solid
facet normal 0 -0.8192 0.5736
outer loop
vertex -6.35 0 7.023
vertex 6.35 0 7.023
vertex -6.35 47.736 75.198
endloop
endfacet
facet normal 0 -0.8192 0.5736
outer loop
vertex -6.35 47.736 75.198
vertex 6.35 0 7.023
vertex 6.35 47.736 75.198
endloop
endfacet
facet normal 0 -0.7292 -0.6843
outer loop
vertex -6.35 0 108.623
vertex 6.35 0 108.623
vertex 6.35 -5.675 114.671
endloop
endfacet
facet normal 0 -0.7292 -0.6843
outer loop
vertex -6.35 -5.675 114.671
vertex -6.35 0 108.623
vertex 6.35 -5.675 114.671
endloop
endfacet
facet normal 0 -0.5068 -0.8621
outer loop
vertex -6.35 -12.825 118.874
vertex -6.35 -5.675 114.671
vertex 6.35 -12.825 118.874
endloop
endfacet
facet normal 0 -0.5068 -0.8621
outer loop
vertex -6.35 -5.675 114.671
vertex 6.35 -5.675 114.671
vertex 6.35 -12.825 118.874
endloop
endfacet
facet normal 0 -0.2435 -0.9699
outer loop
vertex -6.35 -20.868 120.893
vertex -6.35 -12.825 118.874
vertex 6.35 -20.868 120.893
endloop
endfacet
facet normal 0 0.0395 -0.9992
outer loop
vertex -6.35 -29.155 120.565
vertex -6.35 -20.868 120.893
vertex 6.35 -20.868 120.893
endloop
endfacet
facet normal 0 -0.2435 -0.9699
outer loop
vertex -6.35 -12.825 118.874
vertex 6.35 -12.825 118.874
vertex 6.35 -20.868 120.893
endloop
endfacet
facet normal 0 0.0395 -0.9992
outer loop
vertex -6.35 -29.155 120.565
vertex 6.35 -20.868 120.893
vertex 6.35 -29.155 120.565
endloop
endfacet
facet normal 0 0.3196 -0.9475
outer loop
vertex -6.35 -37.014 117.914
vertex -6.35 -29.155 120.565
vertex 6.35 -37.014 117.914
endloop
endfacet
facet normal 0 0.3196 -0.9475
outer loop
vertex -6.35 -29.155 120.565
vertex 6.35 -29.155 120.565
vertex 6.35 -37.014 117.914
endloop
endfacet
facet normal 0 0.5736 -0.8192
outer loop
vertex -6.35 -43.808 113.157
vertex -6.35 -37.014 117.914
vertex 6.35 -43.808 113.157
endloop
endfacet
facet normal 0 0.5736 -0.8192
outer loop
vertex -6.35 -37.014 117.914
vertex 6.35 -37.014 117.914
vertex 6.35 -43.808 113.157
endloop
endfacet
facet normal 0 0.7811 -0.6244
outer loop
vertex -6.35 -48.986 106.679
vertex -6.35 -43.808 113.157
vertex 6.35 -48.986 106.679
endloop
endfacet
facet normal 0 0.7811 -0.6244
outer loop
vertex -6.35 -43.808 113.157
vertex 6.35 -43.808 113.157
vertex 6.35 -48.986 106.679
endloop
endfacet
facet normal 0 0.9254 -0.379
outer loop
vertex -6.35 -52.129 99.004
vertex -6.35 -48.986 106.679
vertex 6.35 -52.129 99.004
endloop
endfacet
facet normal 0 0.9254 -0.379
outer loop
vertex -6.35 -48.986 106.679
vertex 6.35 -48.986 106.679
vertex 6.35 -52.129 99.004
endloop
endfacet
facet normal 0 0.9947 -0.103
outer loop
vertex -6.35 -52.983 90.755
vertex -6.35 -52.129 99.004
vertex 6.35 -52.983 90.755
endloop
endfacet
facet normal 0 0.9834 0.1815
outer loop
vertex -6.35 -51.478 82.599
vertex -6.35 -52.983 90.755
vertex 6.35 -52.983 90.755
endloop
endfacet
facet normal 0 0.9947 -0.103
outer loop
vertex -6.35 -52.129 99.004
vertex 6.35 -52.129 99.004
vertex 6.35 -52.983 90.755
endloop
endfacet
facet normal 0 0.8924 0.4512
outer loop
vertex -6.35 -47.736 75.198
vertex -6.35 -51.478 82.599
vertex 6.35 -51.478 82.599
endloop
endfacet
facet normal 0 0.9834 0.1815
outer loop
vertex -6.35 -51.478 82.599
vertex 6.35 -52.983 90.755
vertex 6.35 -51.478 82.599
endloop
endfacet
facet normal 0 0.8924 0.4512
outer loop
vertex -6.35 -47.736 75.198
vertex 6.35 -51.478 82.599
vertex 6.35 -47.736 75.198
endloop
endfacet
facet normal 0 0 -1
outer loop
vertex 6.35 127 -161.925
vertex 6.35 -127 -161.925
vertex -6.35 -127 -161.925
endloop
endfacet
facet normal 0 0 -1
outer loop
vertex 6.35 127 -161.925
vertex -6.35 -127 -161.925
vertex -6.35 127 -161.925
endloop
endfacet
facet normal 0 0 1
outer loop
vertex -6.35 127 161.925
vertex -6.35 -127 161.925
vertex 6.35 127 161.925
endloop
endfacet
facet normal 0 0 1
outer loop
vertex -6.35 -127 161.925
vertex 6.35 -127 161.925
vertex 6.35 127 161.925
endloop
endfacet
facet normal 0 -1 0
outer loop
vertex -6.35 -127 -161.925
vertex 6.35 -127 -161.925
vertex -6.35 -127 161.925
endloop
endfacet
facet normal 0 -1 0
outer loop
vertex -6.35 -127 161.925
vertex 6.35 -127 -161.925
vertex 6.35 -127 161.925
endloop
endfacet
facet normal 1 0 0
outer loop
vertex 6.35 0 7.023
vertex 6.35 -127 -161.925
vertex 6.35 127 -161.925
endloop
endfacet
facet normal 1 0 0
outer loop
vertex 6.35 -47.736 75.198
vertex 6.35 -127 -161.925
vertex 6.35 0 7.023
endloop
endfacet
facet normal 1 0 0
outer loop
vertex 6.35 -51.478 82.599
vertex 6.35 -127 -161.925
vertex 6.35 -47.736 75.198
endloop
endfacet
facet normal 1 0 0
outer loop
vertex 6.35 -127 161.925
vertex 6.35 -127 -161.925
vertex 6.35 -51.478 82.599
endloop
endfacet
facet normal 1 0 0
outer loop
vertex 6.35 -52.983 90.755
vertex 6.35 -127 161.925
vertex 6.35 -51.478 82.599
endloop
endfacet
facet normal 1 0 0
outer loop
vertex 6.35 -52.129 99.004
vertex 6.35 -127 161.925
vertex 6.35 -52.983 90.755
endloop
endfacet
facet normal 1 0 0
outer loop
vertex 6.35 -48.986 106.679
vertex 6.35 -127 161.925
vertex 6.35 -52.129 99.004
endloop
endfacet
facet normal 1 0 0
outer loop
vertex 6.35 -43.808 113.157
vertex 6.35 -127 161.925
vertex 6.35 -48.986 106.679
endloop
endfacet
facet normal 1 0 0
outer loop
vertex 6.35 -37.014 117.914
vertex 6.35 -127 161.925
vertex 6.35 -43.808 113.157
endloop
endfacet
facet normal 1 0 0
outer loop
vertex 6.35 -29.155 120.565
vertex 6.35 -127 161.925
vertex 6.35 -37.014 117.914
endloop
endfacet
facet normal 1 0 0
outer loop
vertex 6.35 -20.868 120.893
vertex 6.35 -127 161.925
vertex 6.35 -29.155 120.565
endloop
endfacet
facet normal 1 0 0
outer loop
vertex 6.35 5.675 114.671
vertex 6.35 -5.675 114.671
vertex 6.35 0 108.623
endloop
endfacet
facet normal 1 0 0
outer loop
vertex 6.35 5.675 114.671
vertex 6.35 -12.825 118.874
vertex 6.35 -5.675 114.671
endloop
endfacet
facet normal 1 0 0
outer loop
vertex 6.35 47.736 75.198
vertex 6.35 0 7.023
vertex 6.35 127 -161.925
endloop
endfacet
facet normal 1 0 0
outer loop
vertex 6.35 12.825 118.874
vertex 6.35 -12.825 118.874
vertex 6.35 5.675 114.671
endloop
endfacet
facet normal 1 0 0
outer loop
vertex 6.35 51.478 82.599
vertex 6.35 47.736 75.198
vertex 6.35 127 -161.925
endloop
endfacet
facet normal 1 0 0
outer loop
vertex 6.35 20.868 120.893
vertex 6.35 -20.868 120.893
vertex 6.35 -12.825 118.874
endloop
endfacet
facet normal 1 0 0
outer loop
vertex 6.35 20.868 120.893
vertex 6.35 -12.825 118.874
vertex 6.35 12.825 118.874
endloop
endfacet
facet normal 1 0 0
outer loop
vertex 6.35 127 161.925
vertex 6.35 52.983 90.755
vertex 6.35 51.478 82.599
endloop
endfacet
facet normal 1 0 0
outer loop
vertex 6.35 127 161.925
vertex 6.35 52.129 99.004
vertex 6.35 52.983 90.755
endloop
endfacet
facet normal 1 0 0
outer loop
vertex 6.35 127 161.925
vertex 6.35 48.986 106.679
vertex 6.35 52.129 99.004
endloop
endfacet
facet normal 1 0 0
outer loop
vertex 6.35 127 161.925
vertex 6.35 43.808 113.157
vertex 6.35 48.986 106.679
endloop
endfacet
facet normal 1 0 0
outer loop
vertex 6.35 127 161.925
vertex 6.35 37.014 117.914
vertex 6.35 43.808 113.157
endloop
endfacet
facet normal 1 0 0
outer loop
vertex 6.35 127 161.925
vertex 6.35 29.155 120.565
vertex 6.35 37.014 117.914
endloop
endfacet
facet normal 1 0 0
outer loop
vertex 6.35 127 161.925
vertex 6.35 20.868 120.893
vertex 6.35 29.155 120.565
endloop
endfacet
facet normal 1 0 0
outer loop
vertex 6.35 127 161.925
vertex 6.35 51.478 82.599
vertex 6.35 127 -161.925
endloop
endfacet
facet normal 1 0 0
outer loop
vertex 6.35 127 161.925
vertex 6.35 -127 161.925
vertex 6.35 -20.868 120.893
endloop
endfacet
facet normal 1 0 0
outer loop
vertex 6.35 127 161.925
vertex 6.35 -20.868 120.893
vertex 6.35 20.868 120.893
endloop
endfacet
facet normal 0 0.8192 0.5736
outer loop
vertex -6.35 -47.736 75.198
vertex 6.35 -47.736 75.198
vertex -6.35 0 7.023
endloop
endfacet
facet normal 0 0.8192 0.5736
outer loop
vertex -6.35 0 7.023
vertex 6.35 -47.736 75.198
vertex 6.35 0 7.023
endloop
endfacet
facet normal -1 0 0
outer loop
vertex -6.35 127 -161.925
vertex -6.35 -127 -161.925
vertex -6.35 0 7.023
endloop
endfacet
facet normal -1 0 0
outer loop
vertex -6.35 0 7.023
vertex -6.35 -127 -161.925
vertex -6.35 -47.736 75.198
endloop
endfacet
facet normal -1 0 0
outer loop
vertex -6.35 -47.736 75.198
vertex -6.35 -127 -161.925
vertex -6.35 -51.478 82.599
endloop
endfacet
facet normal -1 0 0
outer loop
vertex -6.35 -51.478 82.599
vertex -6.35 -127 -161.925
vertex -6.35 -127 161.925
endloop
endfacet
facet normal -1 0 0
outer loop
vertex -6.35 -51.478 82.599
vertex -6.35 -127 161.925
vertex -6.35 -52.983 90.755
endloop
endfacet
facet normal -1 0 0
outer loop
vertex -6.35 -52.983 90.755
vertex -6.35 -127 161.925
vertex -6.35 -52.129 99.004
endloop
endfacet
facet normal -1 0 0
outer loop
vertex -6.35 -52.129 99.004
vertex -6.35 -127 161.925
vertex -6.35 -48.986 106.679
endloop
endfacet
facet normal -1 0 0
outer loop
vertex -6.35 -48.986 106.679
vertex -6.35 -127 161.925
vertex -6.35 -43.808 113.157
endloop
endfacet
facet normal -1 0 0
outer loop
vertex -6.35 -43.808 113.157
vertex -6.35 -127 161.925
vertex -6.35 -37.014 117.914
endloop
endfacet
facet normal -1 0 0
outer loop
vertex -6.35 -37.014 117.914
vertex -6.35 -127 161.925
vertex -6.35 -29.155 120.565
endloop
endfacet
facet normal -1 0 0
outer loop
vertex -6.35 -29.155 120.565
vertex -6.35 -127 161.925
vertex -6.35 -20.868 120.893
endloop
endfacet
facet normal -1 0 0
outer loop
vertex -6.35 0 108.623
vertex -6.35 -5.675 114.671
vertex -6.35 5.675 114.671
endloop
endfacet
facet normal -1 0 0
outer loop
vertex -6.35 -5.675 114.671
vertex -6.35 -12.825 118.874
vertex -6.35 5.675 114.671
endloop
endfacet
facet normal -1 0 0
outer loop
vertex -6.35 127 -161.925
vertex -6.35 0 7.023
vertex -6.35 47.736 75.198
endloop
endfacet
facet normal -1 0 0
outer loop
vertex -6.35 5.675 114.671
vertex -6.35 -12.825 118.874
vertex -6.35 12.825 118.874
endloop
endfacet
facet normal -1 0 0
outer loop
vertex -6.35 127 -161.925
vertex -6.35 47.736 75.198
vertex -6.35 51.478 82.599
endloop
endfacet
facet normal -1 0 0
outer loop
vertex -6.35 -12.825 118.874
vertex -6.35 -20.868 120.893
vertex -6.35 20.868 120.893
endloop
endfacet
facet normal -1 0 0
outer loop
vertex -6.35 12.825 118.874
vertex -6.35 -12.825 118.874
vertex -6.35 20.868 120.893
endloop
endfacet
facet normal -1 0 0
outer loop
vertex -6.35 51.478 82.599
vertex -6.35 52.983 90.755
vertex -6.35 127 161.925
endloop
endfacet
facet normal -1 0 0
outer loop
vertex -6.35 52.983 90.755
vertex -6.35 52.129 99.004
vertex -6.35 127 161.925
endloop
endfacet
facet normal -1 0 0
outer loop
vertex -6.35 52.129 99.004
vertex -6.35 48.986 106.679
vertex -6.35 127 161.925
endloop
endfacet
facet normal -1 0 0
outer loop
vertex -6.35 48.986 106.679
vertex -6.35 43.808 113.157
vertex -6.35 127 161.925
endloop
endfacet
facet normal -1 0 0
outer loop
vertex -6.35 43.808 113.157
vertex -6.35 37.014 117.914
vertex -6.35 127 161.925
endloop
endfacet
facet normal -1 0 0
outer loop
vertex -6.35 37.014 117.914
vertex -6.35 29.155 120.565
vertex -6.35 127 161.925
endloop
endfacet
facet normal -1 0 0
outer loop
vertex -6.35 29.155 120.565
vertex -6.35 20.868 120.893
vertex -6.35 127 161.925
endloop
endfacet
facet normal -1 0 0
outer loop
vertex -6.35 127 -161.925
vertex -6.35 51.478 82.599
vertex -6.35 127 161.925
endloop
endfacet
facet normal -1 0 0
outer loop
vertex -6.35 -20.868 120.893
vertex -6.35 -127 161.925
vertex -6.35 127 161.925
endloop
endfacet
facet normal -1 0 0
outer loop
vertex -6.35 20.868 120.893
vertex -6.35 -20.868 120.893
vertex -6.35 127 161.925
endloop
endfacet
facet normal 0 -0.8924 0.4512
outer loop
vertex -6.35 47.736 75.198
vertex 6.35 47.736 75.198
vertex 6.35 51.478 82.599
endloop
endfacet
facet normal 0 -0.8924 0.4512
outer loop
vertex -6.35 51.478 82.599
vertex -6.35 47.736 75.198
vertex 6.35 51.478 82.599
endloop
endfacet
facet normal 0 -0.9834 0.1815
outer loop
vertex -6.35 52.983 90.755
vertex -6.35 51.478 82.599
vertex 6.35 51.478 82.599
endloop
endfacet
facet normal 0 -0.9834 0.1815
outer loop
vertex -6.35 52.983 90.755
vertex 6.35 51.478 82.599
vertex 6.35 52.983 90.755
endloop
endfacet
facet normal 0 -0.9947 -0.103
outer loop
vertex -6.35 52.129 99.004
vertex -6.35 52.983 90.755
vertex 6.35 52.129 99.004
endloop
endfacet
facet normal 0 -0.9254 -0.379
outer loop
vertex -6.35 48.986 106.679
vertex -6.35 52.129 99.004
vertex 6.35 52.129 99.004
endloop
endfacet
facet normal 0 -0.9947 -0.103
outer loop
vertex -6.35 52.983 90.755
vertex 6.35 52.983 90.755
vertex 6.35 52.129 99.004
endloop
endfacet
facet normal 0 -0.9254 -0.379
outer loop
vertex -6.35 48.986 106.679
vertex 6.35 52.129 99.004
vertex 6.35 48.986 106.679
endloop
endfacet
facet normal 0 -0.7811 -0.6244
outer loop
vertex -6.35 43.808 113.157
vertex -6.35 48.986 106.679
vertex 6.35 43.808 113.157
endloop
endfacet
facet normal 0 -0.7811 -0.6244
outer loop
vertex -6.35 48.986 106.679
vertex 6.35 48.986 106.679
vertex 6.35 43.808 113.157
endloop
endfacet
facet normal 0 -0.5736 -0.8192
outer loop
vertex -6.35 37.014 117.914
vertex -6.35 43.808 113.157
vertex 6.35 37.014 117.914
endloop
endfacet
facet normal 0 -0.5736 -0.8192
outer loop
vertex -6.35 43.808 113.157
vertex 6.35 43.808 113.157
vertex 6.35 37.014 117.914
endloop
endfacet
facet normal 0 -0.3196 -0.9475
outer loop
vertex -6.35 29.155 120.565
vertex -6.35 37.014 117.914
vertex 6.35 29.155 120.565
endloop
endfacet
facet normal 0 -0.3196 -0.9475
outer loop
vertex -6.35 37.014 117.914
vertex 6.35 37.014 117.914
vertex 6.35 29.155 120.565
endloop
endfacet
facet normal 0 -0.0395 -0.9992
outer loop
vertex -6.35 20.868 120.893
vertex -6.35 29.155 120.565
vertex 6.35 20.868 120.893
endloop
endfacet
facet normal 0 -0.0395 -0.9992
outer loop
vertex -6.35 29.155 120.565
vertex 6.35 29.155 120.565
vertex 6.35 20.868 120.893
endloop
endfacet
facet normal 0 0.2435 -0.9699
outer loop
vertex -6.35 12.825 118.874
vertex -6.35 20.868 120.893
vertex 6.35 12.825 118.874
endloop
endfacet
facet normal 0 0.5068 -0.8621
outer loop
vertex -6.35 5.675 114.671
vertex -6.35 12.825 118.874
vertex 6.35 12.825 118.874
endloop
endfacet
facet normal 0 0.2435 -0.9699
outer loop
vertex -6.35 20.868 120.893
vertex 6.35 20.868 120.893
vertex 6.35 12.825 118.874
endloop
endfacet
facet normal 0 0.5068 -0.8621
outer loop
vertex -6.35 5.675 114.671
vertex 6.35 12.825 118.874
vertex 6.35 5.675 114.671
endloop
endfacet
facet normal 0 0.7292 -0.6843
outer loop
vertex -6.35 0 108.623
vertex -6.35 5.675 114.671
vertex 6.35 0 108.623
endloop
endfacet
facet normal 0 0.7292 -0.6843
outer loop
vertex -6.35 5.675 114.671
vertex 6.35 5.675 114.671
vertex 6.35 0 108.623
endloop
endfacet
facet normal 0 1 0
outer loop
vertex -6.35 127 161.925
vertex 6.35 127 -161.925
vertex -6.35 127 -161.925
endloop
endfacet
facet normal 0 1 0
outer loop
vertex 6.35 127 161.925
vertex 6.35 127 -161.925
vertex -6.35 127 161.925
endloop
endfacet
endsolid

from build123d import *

# Parameters (mm, degrees)
F0_W     = 254
F0_H     = 323.85
F1_DEPTH = 6.35
F3_DEPTH = 12.7


with BuildPart() as f1:
    # F0 (on Right) → F1 (new body, symmetric)
    with BuildSketch(Plane.YZ):
        Rectangle(F0_W, F0_H)
    extrude(amount=F1_DEPTH, both=True)

    # F2 (on Right) → F3 (cut, symmetric)
    with BuildSketch(Plane.YZ):
        Polygon((0, 75.19789), (0, 7.023266), (47.736385, 75.19789), align=None)
        with BuildLine():
            Line((-47.736385, 75.19789), (0, 7.023266))
            Line((0, 7.023266), (0, 75.19789))
            Line((0, 75.19789), (0, 108.623266))
            ThreePointArc((0, 108.623266), (-40.580881, 115.77877), (-47.736385, 75.19789))
        make_face()
        with BuildLine():
            Line((0, 75.19789), (47.736385, 75.19789))
            ThreePointArc((47.736385, 75.19789), (40.580881, 115.77877), (0, 108.623266))
            Line((0, 108.623266), (0, 75.19789))
        make_face()
    extrude(amount=F3_DEPTH, both=True, mode=Mode.SUBTRACT)


solid = f1.part
